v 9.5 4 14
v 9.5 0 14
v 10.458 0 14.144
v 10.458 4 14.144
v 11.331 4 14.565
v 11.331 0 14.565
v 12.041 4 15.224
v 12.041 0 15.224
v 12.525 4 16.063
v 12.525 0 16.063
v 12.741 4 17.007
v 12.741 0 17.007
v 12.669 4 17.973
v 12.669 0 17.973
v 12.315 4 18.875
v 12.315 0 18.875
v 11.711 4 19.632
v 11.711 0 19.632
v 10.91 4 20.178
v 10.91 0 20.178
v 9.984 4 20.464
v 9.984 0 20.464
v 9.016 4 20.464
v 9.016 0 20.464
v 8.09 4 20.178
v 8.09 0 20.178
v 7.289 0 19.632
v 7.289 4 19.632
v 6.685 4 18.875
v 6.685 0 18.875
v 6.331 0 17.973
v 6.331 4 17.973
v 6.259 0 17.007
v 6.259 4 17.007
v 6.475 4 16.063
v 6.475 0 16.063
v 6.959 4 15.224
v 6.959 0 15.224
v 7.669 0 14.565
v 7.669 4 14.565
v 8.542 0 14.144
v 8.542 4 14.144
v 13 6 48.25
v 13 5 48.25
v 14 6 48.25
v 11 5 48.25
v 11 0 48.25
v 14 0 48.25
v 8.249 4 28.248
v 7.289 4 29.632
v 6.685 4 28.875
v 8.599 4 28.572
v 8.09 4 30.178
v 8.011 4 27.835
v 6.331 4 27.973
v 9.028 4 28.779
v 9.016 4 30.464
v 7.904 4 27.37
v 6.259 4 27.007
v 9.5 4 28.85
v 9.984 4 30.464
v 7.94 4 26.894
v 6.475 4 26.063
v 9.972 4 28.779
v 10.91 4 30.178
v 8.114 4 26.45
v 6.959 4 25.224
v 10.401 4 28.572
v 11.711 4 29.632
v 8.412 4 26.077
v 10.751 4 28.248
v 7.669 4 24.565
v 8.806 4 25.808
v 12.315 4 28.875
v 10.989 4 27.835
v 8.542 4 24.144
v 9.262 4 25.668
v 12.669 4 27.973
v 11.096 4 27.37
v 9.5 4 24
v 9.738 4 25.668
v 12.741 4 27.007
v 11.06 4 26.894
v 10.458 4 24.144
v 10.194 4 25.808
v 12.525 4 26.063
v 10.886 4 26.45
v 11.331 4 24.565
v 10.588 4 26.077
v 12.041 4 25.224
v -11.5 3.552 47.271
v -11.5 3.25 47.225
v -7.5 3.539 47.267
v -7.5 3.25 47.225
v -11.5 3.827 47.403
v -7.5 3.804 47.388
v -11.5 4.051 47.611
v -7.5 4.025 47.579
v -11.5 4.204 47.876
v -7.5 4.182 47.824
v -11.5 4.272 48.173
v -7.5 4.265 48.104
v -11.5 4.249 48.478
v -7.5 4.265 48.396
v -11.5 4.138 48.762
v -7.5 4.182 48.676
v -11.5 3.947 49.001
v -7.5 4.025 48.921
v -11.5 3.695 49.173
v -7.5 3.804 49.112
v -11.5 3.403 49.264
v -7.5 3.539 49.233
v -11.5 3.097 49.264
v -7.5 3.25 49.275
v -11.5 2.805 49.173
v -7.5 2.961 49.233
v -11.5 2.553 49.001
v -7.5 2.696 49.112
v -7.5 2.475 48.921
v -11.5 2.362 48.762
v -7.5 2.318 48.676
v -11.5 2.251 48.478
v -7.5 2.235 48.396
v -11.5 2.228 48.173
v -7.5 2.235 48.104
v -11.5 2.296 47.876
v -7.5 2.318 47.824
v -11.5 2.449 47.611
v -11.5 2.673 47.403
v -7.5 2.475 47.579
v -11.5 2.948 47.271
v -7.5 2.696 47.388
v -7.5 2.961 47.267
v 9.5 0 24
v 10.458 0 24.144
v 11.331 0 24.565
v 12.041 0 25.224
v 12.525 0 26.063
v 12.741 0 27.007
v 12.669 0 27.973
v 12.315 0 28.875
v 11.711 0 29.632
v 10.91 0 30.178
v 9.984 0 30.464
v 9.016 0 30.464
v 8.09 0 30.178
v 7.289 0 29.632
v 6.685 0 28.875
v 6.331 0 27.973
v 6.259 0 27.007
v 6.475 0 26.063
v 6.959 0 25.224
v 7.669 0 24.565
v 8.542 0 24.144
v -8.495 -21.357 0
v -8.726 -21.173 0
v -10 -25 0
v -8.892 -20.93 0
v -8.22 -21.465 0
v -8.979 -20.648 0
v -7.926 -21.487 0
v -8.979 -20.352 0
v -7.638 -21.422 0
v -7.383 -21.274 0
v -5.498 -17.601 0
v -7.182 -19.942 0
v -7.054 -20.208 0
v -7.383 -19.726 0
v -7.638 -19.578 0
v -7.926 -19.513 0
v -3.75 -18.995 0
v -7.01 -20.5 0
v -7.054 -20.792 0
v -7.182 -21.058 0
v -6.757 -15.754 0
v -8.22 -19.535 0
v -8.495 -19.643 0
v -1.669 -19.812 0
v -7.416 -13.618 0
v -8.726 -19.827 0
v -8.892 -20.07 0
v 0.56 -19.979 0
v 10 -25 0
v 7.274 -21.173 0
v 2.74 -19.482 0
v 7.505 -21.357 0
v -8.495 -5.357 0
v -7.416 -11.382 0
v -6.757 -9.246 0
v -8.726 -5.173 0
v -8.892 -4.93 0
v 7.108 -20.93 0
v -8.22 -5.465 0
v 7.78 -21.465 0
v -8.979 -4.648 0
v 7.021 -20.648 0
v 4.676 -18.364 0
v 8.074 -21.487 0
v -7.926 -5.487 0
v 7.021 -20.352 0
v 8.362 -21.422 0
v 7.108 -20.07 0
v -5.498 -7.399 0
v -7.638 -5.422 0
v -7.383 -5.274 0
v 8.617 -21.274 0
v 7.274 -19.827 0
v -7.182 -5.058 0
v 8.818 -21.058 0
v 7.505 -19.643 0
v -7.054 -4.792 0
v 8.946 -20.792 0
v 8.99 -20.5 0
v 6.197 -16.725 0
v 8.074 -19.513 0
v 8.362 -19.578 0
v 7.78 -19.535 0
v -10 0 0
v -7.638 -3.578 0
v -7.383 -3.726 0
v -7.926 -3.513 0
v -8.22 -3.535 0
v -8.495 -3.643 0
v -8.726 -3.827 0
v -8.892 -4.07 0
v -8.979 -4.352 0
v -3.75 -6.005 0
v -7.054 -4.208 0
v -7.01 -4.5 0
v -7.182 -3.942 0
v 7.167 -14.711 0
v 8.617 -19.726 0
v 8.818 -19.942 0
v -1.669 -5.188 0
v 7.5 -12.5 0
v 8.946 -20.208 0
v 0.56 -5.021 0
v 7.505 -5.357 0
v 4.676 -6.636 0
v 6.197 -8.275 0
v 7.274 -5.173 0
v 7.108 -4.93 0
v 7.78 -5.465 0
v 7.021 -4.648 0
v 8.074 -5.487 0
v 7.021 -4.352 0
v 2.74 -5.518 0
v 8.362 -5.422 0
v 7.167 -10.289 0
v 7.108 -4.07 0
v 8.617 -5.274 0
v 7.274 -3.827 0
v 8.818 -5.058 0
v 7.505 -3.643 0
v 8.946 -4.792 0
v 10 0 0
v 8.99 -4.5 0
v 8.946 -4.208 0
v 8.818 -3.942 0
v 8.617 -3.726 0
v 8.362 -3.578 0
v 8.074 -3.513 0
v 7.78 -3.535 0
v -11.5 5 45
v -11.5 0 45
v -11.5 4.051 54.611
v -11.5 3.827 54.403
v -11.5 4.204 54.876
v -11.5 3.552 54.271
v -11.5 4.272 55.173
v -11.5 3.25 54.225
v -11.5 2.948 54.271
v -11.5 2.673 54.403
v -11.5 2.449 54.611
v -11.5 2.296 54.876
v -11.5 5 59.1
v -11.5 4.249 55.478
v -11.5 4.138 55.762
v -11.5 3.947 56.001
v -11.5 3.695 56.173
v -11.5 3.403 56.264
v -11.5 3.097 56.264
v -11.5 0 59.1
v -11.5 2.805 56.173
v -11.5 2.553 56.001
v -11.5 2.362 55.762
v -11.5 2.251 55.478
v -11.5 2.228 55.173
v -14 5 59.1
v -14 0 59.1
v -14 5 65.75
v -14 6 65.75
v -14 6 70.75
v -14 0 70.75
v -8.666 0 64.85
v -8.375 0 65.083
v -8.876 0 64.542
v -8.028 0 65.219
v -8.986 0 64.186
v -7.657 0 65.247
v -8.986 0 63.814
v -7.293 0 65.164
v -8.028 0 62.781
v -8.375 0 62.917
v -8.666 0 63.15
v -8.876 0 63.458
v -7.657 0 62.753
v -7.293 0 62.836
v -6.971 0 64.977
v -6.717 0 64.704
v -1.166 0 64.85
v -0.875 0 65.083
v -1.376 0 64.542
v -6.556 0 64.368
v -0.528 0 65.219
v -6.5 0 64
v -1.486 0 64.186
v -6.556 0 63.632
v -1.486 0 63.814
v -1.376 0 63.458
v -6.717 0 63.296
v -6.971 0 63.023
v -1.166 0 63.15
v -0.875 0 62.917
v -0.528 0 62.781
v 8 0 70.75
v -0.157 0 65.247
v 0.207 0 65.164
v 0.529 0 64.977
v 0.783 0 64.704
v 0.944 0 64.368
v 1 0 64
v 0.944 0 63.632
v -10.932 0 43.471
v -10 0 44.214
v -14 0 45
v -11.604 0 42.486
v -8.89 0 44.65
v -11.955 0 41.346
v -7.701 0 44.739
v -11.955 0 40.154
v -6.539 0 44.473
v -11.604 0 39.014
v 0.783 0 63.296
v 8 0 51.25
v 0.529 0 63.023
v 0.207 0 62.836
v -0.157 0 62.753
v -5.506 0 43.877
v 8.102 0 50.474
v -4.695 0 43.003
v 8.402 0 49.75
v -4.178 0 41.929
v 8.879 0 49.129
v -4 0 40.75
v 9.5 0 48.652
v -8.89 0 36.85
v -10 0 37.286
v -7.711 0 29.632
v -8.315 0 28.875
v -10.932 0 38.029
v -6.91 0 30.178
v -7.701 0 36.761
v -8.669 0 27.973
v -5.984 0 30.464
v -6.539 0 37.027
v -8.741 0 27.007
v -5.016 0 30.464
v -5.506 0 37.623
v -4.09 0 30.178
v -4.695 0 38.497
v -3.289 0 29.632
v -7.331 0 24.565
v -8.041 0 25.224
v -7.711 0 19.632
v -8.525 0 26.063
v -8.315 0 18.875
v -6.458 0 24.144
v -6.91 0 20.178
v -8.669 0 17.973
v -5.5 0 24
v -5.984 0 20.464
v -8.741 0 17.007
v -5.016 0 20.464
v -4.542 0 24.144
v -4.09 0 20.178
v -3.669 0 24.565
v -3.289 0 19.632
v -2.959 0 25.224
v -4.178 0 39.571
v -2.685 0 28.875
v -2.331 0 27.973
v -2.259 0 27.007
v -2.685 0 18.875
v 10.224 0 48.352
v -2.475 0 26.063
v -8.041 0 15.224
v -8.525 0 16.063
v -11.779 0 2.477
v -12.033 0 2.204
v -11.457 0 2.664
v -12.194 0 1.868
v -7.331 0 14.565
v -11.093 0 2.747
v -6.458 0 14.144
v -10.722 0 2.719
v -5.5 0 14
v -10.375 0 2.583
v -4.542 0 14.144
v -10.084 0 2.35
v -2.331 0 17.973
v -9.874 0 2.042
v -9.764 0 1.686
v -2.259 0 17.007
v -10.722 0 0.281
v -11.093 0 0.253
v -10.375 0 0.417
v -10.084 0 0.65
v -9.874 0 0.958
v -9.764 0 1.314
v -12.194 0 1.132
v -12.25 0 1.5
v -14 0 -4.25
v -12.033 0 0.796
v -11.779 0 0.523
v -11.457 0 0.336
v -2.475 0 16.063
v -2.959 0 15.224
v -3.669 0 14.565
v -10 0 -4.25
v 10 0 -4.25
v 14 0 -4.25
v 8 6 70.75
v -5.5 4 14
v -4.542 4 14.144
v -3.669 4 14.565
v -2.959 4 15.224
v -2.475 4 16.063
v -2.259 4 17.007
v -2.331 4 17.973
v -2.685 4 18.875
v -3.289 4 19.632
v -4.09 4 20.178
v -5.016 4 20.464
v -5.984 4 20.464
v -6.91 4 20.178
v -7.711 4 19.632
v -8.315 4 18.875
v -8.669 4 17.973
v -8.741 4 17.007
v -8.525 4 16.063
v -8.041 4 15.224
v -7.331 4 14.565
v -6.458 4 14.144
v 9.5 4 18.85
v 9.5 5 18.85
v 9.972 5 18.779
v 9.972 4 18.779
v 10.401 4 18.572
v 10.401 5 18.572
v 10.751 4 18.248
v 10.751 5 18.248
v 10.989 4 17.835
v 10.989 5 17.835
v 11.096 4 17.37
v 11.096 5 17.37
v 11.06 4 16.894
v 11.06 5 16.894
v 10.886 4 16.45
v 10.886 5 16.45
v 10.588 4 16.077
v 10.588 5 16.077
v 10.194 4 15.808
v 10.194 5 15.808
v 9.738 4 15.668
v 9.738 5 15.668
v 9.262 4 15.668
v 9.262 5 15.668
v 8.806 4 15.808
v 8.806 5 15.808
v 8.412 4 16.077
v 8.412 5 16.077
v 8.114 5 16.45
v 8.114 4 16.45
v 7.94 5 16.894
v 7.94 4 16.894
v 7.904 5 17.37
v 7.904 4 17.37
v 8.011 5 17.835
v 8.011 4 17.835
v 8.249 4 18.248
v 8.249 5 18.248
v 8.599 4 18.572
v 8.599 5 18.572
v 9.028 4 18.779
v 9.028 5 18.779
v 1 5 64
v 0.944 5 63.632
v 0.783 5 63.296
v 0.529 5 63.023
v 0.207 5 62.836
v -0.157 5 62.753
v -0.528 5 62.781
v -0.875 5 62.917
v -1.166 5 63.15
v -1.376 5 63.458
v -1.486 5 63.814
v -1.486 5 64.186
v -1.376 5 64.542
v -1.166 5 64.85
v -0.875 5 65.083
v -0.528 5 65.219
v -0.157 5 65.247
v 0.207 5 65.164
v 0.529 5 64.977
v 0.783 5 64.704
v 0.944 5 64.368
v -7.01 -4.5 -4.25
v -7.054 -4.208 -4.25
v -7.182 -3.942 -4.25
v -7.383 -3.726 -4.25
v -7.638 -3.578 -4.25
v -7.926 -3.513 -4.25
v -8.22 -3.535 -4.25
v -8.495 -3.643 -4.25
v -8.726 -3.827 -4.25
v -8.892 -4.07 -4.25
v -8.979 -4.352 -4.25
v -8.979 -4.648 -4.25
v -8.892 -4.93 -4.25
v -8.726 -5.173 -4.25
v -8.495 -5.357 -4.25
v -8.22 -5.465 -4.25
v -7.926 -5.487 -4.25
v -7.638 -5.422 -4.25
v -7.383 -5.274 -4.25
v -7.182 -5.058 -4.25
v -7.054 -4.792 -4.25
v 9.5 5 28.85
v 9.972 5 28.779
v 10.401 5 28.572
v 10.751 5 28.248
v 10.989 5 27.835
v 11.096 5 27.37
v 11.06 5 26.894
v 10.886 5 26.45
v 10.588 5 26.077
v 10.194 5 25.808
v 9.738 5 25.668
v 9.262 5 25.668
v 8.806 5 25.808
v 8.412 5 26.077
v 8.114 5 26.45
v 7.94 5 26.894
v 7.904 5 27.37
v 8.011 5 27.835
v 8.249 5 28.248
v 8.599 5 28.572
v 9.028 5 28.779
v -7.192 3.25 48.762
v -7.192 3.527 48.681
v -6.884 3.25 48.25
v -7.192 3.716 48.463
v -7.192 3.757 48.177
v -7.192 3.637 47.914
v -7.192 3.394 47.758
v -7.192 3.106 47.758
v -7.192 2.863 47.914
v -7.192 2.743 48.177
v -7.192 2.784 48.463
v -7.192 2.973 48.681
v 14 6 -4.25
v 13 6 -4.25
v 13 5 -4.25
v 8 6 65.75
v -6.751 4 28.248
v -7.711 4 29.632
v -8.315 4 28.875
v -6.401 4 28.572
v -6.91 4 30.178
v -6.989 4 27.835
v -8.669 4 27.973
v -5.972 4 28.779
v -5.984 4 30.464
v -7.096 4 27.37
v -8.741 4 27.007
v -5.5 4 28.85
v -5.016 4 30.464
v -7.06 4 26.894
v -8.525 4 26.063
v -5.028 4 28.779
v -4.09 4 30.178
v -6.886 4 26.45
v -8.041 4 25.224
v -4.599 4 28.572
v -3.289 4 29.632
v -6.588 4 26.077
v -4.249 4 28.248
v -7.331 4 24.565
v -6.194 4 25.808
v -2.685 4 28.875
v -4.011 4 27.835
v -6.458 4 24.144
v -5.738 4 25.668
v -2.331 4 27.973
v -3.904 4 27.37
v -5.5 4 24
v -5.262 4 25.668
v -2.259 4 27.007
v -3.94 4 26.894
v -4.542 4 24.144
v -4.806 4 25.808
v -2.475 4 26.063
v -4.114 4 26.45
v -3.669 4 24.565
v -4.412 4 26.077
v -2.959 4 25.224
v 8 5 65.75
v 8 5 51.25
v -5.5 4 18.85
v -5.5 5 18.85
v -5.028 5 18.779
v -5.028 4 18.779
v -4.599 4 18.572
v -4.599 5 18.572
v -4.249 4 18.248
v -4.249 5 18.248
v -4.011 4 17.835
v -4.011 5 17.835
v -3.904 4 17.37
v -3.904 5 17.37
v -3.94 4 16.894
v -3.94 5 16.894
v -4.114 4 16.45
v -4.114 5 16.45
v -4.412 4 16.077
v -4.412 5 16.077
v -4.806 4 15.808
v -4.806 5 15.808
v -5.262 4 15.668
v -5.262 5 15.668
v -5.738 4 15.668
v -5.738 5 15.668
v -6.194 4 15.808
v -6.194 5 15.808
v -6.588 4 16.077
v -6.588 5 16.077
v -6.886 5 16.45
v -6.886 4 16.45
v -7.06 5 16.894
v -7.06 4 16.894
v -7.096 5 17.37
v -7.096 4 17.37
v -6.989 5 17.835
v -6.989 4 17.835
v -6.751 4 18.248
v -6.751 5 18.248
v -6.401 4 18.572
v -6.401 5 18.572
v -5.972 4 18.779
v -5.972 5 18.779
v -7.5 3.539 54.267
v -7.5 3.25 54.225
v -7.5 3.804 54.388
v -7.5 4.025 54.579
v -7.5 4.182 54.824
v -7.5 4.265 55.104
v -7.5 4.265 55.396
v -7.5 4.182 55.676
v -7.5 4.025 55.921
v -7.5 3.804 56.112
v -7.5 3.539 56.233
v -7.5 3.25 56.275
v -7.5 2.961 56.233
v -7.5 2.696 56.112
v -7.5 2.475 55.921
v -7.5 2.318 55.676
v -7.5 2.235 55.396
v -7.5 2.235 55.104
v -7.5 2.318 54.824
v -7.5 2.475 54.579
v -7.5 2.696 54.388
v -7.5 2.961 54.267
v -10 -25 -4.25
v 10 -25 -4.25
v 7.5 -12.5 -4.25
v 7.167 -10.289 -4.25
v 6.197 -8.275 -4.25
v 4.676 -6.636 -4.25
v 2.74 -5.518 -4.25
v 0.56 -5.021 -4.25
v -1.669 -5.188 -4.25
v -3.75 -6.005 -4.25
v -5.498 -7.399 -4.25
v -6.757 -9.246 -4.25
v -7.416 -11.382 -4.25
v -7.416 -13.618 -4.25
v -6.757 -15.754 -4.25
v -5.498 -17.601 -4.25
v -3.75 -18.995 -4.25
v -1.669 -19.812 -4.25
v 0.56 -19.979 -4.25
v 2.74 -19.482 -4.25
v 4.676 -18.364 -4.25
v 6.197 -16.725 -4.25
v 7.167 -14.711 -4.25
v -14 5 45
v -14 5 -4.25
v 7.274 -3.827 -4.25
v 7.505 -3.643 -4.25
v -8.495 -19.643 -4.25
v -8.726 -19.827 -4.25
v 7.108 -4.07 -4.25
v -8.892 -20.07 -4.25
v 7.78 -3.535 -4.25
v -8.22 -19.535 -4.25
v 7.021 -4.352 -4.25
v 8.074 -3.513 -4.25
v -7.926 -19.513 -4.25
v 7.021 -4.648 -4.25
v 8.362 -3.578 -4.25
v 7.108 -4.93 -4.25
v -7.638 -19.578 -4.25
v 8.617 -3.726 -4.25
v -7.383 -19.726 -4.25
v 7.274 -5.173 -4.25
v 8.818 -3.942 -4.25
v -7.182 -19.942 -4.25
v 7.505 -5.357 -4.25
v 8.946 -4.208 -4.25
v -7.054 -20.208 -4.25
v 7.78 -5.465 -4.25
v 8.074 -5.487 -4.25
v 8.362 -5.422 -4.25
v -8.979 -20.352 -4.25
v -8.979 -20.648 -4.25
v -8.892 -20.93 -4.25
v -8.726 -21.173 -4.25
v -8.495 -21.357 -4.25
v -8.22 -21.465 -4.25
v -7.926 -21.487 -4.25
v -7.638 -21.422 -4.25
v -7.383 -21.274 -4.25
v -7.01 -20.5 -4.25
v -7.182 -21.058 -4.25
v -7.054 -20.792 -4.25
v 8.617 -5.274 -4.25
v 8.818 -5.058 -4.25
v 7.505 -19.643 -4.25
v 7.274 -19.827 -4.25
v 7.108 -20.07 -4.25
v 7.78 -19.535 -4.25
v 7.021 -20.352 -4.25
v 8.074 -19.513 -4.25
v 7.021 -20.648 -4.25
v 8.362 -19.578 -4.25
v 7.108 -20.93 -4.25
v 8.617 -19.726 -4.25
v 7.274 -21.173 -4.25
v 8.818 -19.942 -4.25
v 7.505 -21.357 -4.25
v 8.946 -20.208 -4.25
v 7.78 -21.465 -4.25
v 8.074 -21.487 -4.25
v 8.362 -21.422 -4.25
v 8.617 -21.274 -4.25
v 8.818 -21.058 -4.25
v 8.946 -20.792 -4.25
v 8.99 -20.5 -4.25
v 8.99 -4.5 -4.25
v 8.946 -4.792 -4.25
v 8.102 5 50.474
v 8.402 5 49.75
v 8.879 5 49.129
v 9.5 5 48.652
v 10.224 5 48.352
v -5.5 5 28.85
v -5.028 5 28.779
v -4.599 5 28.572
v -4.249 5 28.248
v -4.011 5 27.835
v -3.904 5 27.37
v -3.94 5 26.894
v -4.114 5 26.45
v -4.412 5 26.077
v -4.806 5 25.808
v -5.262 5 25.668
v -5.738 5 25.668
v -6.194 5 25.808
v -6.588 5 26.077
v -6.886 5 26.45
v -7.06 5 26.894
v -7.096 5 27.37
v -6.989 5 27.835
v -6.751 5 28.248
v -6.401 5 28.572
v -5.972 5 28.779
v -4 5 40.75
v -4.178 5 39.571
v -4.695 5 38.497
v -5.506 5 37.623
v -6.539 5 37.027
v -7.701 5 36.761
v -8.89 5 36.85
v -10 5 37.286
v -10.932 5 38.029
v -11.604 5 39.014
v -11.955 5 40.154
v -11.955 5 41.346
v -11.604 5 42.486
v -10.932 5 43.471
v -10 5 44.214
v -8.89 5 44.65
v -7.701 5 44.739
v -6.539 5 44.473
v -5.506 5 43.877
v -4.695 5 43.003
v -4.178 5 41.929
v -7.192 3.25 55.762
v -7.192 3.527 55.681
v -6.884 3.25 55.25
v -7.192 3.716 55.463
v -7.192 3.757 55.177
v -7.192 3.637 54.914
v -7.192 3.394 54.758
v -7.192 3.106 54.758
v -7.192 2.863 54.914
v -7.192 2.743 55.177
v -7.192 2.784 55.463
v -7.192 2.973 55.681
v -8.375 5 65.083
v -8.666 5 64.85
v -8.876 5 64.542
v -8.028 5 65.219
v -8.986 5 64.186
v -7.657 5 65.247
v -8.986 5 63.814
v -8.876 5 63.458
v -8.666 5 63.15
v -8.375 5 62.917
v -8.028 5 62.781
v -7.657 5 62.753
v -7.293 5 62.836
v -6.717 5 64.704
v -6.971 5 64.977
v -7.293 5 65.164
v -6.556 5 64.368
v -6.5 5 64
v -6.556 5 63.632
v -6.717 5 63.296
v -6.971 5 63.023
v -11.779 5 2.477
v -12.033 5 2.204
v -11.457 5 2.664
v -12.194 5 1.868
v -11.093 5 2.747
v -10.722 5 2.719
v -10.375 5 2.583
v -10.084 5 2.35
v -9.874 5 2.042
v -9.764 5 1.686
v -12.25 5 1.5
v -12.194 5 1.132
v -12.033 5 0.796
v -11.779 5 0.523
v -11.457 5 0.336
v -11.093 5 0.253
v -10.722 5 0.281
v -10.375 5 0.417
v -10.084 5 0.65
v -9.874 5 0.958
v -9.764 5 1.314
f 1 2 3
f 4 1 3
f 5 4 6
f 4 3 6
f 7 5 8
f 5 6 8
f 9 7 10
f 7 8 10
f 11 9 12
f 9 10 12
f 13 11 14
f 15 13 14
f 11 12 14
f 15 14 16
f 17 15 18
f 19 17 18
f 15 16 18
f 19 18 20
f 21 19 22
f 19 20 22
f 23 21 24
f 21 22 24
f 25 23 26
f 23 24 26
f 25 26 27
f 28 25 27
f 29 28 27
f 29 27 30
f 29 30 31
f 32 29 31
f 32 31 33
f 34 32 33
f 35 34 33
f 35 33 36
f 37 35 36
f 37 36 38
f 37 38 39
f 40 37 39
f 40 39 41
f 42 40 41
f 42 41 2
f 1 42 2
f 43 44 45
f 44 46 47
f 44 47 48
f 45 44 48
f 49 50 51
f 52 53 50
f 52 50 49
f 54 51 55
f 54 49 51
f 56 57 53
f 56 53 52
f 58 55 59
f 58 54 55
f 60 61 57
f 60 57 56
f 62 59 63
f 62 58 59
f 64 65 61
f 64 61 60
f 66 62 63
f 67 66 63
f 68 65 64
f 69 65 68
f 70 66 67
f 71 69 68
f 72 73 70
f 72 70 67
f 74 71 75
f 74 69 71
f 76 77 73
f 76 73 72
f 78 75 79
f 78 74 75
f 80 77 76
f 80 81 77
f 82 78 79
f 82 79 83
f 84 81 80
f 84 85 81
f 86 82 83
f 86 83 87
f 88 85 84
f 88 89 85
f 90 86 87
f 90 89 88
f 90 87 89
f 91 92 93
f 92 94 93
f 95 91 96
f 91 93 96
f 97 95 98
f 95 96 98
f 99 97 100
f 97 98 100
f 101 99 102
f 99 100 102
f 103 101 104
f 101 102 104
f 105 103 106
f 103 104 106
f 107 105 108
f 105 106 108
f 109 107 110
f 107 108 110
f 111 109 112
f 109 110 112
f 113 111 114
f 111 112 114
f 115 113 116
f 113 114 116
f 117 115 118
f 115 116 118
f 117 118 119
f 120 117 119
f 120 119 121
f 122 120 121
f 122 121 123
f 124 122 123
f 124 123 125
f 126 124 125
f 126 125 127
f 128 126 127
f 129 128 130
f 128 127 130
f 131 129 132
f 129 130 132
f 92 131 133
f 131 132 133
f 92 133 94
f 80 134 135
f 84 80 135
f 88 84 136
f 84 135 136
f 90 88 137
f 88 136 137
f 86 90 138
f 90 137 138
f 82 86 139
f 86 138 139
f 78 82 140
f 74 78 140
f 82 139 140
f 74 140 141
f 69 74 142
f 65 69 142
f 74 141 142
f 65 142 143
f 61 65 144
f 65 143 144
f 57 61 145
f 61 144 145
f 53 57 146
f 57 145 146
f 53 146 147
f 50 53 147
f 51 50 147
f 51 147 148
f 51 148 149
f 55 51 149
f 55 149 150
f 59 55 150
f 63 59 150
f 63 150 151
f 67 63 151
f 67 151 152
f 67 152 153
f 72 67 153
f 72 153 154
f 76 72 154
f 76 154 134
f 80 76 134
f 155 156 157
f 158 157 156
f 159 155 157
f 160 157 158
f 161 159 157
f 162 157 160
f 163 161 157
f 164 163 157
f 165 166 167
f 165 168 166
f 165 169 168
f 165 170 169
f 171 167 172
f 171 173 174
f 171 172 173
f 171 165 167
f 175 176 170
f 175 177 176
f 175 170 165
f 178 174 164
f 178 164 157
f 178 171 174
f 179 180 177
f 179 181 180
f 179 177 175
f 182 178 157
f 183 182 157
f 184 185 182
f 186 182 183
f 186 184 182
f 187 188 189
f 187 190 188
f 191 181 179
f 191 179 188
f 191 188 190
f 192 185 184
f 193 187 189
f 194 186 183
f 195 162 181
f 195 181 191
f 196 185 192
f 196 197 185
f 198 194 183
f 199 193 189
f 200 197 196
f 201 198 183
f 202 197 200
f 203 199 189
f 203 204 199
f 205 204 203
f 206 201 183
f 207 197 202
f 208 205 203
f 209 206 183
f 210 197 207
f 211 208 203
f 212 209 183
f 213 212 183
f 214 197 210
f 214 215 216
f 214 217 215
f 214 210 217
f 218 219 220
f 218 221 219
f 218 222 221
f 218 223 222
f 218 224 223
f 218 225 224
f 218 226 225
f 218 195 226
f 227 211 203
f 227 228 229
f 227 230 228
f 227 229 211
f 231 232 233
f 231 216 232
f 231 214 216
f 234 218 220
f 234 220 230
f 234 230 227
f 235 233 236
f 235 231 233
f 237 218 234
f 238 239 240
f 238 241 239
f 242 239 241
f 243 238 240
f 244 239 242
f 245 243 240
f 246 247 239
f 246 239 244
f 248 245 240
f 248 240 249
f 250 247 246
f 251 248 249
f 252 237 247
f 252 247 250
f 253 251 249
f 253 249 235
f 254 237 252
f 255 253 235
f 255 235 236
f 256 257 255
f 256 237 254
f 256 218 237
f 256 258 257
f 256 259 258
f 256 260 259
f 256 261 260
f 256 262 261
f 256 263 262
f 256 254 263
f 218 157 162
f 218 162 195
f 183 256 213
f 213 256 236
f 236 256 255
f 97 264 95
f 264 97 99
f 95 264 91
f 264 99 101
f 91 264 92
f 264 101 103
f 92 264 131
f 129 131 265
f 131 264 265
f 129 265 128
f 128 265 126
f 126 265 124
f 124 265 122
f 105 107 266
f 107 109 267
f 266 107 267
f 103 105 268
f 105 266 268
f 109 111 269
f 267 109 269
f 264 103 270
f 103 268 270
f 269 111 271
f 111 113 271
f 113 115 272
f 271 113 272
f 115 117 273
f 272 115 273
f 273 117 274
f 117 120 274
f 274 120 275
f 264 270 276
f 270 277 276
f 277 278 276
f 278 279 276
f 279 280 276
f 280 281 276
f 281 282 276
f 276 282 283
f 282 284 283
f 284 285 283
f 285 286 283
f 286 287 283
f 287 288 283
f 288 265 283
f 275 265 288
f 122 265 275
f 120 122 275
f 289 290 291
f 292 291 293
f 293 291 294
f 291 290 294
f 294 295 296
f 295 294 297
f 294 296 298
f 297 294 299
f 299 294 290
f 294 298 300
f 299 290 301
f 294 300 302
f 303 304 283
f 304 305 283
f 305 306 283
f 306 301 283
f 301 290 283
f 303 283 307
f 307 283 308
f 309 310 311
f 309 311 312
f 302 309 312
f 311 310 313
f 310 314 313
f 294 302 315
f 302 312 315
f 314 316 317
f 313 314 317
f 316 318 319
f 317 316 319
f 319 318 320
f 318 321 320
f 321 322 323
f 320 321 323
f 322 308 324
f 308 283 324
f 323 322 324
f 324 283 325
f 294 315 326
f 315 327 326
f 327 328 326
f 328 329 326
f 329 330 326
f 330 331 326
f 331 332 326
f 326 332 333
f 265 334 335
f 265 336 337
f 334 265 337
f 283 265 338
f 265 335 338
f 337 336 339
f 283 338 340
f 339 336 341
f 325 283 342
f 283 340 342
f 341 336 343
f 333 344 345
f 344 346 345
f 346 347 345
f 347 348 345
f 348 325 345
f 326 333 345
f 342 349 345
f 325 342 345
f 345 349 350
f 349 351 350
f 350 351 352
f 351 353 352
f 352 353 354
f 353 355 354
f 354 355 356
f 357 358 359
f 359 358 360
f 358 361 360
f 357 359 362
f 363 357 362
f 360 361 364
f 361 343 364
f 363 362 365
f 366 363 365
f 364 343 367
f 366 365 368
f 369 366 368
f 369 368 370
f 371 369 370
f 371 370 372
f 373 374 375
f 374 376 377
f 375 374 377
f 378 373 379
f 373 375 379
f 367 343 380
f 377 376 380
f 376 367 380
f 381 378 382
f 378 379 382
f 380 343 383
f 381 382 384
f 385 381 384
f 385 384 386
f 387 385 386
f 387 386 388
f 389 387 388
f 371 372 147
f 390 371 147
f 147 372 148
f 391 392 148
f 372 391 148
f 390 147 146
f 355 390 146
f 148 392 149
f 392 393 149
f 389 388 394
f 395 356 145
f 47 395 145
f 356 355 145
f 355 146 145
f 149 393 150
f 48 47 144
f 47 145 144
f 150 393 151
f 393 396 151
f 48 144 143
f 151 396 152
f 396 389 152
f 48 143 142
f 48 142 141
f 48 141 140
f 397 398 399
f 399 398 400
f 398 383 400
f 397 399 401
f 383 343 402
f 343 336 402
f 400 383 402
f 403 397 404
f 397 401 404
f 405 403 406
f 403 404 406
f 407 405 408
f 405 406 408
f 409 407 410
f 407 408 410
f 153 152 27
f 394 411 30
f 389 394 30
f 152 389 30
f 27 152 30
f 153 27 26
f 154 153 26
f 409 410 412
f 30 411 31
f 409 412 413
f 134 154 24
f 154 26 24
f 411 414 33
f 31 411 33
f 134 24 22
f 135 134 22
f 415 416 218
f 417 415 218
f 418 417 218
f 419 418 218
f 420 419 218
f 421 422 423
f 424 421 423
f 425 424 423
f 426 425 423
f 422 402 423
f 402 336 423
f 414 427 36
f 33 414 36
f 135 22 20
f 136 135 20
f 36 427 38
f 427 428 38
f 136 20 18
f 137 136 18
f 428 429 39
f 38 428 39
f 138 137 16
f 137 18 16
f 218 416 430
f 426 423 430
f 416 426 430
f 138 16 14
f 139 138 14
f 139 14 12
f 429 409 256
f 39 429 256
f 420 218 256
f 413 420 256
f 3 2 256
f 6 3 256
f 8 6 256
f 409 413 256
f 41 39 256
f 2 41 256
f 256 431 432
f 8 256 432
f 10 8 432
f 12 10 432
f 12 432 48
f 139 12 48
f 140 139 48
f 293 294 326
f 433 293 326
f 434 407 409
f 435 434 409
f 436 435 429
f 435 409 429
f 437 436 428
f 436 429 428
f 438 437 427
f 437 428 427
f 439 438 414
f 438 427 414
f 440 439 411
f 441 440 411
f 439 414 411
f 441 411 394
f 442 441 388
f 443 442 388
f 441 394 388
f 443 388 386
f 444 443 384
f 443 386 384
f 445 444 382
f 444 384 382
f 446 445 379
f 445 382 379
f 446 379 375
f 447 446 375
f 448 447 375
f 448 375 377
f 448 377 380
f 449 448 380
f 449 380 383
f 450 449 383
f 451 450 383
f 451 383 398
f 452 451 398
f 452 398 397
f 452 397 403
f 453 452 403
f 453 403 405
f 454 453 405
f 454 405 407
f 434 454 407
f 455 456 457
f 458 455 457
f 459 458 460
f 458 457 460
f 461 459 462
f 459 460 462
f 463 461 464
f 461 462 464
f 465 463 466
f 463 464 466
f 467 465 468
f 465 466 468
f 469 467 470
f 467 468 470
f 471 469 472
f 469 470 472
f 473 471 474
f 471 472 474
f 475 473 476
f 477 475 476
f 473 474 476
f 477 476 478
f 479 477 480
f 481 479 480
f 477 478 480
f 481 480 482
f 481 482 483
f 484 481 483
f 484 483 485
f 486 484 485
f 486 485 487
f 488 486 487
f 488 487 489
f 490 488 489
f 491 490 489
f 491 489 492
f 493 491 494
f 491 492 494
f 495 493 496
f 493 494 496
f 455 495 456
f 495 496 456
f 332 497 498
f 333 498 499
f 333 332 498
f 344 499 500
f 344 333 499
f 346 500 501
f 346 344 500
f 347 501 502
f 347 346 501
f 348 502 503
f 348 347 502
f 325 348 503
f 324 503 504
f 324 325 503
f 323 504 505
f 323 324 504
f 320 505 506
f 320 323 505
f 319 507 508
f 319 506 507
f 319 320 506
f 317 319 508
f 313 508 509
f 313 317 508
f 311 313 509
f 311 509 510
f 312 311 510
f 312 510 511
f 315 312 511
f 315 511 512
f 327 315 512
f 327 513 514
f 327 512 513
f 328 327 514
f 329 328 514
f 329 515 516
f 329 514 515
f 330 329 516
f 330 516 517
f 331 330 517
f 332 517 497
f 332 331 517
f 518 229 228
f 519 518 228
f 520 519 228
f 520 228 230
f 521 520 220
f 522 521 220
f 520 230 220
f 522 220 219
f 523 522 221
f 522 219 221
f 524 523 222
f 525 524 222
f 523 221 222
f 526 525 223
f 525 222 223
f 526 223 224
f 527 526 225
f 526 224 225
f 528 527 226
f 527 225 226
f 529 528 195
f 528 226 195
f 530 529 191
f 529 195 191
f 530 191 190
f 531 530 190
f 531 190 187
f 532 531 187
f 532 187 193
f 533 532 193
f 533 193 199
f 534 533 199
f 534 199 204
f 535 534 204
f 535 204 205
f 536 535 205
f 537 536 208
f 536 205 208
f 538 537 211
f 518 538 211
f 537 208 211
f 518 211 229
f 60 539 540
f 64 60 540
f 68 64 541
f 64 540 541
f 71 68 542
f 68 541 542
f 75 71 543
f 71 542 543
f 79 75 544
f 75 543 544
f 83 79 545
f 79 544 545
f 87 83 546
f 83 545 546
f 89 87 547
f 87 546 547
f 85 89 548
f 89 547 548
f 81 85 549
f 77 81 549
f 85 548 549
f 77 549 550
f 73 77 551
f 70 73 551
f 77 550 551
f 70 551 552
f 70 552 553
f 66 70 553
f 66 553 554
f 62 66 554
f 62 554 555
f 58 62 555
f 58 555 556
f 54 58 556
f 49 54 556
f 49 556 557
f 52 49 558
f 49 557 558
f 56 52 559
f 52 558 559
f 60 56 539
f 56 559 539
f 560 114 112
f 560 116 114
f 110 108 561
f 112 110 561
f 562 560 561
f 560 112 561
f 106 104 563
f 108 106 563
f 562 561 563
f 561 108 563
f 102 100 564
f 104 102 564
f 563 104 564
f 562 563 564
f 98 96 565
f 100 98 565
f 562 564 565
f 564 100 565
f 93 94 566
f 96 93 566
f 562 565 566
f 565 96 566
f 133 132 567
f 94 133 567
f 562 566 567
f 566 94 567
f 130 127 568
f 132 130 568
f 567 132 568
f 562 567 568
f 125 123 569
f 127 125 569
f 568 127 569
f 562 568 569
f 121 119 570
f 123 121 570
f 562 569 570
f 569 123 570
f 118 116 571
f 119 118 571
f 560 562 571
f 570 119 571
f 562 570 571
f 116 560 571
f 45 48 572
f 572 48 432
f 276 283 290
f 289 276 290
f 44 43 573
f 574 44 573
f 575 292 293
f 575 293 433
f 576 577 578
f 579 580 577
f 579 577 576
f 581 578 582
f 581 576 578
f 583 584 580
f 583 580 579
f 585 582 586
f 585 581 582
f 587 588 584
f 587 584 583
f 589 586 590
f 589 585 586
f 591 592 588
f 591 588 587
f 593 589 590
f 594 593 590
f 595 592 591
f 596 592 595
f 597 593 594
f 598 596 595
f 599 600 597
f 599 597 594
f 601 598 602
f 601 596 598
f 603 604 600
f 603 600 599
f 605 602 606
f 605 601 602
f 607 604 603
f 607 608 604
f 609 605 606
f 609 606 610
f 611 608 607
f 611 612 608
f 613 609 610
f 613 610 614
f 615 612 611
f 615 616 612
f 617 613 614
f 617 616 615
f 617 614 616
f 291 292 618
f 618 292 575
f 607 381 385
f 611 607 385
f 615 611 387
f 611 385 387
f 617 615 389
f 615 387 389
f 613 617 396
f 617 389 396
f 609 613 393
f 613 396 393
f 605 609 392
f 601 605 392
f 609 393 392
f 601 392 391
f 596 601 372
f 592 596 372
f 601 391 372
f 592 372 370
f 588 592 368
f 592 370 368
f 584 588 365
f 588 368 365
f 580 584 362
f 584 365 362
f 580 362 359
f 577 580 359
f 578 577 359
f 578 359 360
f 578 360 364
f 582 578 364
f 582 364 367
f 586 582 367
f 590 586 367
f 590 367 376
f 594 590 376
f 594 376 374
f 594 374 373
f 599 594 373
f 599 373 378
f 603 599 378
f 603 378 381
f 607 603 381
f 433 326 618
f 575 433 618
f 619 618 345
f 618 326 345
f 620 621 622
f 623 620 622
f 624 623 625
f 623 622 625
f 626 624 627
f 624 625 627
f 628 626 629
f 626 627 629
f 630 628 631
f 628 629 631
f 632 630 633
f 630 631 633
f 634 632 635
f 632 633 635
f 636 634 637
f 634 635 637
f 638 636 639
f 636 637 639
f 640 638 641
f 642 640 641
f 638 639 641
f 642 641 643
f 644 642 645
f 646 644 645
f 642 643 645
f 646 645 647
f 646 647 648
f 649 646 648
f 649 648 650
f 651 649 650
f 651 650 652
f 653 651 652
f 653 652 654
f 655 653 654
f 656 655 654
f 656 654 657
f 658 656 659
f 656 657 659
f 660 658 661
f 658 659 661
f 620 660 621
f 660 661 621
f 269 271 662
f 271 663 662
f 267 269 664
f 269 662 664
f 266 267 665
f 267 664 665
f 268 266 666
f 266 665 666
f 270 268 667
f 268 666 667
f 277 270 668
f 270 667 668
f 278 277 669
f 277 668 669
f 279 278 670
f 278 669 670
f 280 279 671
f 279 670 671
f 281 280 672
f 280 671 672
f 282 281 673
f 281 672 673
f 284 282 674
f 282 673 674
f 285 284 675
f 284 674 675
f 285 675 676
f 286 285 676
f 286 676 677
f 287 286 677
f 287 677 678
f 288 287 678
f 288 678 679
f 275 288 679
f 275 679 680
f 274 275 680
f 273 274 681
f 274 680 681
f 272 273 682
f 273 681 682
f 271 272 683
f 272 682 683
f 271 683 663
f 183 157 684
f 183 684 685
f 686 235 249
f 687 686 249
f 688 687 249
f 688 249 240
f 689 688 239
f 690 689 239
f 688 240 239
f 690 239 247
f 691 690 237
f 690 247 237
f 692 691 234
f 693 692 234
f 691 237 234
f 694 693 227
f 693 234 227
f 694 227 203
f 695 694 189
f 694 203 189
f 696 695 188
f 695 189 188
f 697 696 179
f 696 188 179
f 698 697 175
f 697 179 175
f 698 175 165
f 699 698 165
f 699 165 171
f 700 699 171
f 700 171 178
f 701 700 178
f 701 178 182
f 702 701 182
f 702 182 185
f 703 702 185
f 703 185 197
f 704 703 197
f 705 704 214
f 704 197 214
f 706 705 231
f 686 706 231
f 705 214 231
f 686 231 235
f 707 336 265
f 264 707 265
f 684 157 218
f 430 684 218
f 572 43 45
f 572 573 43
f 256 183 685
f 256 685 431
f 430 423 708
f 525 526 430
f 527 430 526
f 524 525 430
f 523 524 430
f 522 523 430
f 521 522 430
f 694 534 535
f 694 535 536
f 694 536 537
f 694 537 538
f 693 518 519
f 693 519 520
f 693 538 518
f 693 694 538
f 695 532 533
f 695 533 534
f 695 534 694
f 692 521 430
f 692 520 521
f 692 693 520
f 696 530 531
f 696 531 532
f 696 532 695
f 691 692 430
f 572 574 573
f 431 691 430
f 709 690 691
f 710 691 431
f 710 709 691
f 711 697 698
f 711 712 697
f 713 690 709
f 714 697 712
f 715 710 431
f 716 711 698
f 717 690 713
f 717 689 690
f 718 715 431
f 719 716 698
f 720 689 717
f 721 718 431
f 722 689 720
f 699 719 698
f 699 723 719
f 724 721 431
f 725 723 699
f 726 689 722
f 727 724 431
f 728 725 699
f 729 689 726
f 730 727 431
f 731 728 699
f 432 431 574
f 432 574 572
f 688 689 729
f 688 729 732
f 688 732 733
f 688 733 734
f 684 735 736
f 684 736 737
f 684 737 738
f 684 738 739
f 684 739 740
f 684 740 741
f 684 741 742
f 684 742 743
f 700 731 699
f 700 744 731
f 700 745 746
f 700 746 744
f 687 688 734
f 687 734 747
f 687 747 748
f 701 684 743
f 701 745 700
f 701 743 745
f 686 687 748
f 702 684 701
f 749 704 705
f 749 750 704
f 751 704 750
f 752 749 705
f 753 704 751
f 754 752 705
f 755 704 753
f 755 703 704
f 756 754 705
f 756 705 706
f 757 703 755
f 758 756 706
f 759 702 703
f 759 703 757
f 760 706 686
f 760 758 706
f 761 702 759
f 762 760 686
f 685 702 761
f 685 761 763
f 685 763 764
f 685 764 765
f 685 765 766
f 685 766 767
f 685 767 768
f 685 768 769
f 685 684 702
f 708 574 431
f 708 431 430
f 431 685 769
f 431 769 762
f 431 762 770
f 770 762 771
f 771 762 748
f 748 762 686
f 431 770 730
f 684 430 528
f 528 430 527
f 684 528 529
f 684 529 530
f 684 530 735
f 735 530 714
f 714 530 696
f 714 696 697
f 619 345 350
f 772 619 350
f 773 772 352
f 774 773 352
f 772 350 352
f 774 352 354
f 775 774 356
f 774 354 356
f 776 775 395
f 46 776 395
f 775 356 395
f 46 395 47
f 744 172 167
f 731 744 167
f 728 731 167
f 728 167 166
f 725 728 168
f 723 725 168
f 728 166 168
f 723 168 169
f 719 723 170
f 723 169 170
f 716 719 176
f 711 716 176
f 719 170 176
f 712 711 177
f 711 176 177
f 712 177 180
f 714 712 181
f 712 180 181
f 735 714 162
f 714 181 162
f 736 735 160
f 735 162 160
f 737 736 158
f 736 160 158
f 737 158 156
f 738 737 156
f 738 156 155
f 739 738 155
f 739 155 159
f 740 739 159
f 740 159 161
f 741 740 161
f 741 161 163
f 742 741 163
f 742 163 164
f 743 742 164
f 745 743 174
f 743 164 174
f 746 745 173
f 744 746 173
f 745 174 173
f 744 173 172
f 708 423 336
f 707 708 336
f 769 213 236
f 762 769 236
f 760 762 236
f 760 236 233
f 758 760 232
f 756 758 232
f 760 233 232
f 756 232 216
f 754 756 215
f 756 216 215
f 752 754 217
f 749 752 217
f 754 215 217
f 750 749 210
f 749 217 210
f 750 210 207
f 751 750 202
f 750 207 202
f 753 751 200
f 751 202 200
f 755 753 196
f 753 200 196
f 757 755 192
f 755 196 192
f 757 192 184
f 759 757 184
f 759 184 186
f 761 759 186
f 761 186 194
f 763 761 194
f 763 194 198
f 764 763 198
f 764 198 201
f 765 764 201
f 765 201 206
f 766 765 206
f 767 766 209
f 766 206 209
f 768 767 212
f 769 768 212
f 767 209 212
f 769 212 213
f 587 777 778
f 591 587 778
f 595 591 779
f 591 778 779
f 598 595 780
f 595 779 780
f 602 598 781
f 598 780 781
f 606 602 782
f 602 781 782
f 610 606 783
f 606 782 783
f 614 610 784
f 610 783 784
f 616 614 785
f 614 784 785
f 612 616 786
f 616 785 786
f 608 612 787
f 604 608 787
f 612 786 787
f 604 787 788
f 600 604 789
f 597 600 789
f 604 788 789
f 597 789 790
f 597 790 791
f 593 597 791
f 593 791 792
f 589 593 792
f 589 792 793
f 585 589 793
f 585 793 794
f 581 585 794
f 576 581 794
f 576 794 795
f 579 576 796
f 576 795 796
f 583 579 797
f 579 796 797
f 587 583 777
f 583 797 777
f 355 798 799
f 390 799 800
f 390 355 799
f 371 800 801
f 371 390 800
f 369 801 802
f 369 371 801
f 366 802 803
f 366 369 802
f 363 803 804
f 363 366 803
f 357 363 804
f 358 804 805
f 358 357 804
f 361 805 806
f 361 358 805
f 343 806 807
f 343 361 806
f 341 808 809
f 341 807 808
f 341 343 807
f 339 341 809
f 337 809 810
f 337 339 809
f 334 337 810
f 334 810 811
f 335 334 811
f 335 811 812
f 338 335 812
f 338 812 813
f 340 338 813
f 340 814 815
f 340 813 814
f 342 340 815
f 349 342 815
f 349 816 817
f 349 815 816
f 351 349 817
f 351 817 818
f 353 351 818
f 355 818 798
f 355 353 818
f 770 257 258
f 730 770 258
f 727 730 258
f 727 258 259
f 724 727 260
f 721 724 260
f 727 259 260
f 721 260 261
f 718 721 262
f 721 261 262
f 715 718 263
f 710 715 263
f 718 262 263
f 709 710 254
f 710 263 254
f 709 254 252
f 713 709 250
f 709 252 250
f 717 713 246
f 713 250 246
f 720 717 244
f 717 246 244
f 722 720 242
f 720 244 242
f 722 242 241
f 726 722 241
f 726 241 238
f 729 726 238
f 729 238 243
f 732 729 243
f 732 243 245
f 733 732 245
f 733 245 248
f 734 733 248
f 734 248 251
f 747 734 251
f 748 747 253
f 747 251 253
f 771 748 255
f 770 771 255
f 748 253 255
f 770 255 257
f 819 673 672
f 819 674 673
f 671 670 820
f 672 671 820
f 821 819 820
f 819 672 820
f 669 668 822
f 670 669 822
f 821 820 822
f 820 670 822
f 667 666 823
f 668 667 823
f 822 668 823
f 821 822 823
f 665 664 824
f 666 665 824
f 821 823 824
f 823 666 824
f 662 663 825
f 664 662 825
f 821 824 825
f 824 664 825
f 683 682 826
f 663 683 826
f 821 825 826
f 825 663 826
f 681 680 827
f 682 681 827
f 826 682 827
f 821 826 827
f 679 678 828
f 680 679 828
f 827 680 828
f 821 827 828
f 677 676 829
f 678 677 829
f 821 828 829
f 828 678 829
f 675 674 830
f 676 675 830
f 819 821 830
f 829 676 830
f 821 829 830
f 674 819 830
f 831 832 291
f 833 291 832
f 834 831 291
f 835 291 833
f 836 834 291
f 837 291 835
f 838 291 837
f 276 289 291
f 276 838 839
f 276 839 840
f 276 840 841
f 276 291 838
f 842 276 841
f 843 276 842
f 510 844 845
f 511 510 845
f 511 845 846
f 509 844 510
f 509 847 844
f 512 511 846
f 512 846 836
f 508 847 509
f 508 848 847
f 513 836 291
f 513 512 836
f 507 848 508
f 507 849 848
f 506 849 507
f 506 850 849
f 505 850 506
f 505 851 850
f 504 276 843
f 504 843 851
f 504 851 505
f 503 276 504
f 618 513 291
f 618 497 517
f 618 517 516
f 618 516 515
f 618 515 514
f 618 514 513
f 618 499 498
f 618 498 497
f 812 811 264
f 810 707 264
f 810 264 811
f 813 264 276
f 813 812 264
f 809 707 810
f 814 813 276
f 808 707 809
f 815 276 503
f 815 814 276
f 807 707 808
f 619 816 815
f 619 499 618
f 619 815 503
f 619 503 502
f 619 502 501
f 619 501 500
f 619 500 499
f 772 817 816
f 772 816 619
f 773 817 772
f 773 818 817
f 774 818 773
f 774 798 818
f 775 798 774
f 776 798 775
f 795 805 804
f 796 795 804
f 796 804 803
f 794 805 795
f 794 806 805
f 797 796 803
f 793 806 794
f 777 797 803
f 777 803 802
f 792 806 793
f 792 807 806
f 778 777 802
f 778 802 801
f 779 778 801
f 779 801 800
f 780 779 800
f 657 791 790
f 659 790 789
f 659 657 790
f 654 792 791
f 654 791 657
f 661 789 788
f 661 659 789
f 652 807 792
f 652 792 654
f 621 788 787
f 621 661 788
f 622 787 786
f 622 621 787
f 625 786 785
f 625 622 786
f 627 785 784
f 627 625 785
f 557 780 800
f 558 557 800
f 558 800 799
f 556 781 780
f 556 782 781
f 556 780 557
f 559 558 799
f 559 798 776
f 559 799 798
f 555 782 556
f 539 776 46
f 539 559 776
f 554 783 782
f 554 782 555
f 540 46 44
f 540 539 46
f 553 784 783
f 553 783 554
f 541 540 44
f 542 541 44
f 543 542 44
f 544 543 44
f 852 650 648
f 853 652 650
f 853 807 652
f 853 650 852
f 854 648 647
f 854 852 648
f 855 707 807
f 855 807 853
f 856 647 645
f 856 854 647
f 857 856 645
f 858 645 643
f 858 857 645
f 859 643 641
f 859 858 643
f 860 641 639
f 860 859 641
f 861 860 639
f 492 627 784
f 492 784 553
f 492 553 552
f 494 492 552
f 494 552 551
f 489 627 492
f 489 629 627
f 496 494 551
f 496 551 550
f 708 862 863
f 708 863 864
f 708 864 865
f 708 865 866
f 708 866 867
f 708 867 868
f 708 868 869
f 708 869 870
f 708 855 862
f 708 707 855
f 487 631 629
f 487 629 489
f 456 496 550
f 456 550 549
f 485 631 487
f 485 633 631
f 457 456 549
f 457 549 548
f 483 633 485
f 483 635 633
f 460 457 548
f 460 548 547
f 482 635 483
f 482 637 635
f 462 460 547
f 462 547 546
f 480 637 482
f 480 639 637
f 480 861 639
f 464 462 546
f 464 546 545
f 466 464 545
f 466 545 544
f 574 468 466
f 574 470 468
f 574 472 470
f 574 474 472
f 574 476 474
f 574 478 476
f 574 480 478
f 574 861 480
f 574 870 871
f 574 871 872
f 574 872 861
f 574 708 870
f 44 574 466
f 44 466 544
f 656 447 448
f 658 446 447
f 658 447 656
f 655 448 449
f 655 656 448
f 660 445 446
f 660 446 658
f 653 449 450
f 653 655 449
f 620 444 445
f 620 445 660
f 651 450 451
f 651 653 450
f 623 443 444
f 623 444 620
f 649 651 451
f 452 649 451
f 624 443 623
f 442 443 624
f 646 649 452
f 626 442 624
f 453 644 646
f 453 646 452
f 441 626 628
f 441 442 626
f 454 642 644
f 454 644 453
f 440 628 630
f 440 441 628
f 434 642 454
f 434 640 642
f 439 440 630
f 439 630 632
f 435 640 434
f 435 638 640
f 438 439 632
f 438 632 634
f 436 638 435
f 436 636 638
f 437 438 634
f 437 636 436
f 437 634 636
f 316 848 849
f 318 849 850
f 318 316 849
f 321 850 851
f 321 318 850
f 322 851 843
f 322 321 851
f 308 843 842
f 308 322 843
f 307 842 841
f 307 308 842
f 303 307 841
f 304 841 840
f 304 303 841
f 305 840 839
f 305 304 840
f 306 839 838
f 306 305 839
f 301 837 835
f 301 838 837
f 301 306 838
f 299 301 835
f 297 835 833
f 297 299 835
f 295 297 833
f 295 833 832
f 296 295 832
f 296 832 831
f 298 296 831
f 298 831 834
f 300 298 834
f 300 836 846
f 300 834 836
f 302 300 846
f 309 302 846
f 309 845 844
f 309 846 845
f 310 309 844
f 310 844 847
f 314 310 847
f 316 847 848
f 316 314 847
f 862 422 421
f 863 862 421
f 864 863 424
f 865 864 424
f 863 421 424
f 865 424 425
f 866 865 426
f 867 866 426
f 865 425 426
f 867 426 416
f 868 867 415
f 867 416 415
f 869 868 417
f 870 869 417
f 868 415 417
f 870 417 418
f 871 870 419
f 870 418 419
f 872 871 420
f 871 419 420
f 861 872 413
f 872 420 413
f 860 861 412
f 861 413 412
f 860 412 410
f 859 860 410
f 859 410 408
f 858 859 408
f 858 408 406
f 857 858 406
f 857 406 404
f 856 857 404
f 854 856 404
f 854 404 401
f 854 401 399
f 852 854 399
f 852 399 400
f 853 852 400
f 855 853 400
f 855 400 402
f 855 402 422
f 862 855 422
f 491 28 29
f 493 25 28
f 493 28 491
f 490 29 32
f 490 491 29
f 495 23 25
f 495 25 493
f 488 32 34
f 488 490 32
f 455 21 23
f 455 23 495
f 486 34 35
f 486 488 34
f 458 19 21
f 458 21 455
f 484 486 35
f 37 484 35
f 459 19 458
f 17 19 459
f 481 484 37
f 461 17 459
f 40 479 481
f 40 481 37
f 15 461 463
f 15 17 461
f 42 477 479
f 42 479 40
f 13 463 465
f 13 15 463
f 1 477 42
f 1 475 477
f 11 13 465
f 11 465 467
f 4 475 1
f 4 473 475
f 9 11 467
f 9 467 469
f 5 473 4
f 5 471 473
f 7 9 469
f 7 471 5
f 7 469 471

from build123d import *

# Parameters (mm, degrees)
BACK_SKETCH_R                                  = 0.8
BACK_SKETCH_R_2                                = 4
BACK_SKETCH_R_3                                = 1.25
BACK_EXTRUDE_DEPTH                             = 6
BOTTOM_SKETCH_W                                = 20
BOTTOM_SKETCH_H                                = 25
BOTTOM_SKETCH_R                                = 0.989941464
BOTTOM_SKETCH_R_2                              = 7.5
BOTTOM_EXTRUDE_DEPTH                           = 4.25
CARRAIGE_MOUNT_M3S_D                           = 3.2
CARRAIGE_MOUNT_M3S_CBORE_D                     = 6.5
CARRAIGE_MOUNT_M3S_CBORE_DEPTH                 = 4
ROTATIONAL_SENSOR_TAPPED_HOLES_M2_5X0_45_D     = 2.05
ROTATIONAL_SENSOR_TAPPED_HOLES_M2_5X0_45_DEPTH = 4
ROTATIONAL_SENSOR_TAPPED_HOLES_M2_5X0_45_TIP   = 0.615882135
M3X0_5_TAPPED_HOLE1_D                          = 2.5
SKETCH5_W                                      = 27
SKETCH5_H                                      = 70
BACK_RECESS_CUT_DEPTH                          = 1


with BuildPart() as part:
    # Back Sketch → Back Extrude (new body)
    with BuildSketch(Plane(origin=(0, 0, 0), x_dir=(1, 0, 0), z_dir=(0, 1, 0))):
        with BuildLine():
            Line((14, 4.25), (14, -48.25))
            Line((14, -48.25), (11, -48.25))
            ThreePointArc((11, -48.25), (8.878679656, -49.128679656), (8, -51.25))
            Line((8, -51.25), (8, -70.75))
            Line((8, -70.75), (-14, -70.75))
            Line((-14, -70.75), (-14, -59.1))
            Line((-14, -59.1), (-11.5, -59.1))
            Line((-11.5, -59.1), (-11.5, -45))
            Line((-11.5, -45), (-14, -45))
            Line((-14, -45), (-14, 4.25))
            Line((-14, 4.25), (14, 4.25))
        make_face()
        with Locations((9.5, -17.25)):
            Circle(BACK_SKETCH_R, mode=Mode.SUBTRACT)
        with Locations((-5.5, -17.25)):
            Circle(BACK_SKETCH_R, mode=Mode.SUBTRACT)
        with Locations((-5.5, -27.25)):
            Circle(BACK_SKETCH_R, mode=Mode.SUBTRACT)
        with Locations((9.5, -27.25)):
            Circle(BACK_SKETCH_R, mode=Mode.SUBTRACT)
        with Locations((-8, -40.75)):
            Circle(BACK_SKETCH_R_2, mode=Mode.SUBTRACT)
        with Locations((-7.75, -64)):
            Circle(BACK_SKETCH_R_3, mode=Mode.SUBTRACT)
        with Locations((-0.25, -64)):
            Circle(BACK_SKETCH_R_3, mode=Mode.SUBTRACT)
    extrude(amount=BACK_EXTRUDE_DEPTH)

    # Bottom Sketch → Bottom Extrude (add)
    with BuildSketch(Plane.XY):
        with Locations((0, -12.5)):
            Rectangle(BOTTOM_SKETCH_W, BOTTOM_SKETCH_H)
        with Locations((-8, -20.5)):
            Circle(BOTTOM_SKETCH_R, mode=Mode.SUBTRACT)
        with Locations((8, -20.5)):
            Circle(BOTTOM_SKETCH_R, mode=Mode.SUBTRACT)
        with Locations((-8, -4.5)):
            Circle(BOTTOM_SKETCH_R, mode=Mode.SUBTRACT)
        with Locations((0, -12.5)):
            Circle(BOTTOM_SKETCH_R_2, mode=Mode.SUBTRACT)
        with Locations((8, -4.5)):
            Circle(BOTTOM_SKETCH_R, mode=Mode.SUBTRACT)
    extrude(amount=-BOTTOM_EXTRUDE_DEPTH)

    # Carraige Mount  M3s (through all)
    with Locations(Plane(origin=(9.5, 0, 27.25), x_dir=(0, 0, -1), z_dir=(0, -1, 0))):
        with Locations((0, 0), (0, -15), (10, -15), (10, 0)):
            CounterBoreHole(CARRAIGE_MOUNT_M3S_D / 2, CARRAIGE_MOUNT_M3S_CBORE_D / 2, CARRAIGE_MOUNT_M3S_CBORE_DEPTH)

    # Rotational Sensor Tapped Holes M2.5x0.45 Tapped Holes
    with Locations(Plane.ZY.offset(11.5)):
        with Locations((55.25, 3.25), (48.25, 3.25)):
            Hole(ROTATIONAL_SENSOR_TAPPED_HOLES_M2_5X0_45_D / 2, depth=ROTATIONAL_SENSOR_TAPPED_HOLES_M2_5X0_45_DEPTH)
            with Locations((0, 0, -(ROTATIONAL_SENSOR_TAPPED_HOLES_M2_5X0_45_DEPTH + ROTATIONAL_SENSOR_TAPPED_HOLES_M2_5X0_45_TIP / 2))):  # 118° drill point
                Cone(0, ROTATIONAL_SENSOR_TAPPED_HOLES_M2_5X0_45_D / 2, ROTATIONAL_SENSOR_TAPPED_HOLES_M2_5X0_45_TIP, mode=Mode.SUBTRACT)

    # M3x0.5 Tapped Hole1 (through all)
    with Locations(Plane(origin=(0, 6, 0), x_dir=(1, 0, 0), z_dir=(0, 1, 0))):
        with Locations((-11, -1.5)):
            Hole(M3X0_5_TAPPED_HOLE1_D / 2)

    # Sketch5 → Back Recess Cut (cut)
    with BuildSketch(Plane(origin=(0, 6, 0), x_dir=(1, 0, 0), z_dir=(0, 1, 0))):
        with Locations((-0.5, -30.75)):
            Rectangle(SKETCH5_W, SKETCH5_H)
    extrude(amount=-BACK_RECESS_CUT_DEPTH, mode=Mode.SUBTRACT)


solid = part.part
